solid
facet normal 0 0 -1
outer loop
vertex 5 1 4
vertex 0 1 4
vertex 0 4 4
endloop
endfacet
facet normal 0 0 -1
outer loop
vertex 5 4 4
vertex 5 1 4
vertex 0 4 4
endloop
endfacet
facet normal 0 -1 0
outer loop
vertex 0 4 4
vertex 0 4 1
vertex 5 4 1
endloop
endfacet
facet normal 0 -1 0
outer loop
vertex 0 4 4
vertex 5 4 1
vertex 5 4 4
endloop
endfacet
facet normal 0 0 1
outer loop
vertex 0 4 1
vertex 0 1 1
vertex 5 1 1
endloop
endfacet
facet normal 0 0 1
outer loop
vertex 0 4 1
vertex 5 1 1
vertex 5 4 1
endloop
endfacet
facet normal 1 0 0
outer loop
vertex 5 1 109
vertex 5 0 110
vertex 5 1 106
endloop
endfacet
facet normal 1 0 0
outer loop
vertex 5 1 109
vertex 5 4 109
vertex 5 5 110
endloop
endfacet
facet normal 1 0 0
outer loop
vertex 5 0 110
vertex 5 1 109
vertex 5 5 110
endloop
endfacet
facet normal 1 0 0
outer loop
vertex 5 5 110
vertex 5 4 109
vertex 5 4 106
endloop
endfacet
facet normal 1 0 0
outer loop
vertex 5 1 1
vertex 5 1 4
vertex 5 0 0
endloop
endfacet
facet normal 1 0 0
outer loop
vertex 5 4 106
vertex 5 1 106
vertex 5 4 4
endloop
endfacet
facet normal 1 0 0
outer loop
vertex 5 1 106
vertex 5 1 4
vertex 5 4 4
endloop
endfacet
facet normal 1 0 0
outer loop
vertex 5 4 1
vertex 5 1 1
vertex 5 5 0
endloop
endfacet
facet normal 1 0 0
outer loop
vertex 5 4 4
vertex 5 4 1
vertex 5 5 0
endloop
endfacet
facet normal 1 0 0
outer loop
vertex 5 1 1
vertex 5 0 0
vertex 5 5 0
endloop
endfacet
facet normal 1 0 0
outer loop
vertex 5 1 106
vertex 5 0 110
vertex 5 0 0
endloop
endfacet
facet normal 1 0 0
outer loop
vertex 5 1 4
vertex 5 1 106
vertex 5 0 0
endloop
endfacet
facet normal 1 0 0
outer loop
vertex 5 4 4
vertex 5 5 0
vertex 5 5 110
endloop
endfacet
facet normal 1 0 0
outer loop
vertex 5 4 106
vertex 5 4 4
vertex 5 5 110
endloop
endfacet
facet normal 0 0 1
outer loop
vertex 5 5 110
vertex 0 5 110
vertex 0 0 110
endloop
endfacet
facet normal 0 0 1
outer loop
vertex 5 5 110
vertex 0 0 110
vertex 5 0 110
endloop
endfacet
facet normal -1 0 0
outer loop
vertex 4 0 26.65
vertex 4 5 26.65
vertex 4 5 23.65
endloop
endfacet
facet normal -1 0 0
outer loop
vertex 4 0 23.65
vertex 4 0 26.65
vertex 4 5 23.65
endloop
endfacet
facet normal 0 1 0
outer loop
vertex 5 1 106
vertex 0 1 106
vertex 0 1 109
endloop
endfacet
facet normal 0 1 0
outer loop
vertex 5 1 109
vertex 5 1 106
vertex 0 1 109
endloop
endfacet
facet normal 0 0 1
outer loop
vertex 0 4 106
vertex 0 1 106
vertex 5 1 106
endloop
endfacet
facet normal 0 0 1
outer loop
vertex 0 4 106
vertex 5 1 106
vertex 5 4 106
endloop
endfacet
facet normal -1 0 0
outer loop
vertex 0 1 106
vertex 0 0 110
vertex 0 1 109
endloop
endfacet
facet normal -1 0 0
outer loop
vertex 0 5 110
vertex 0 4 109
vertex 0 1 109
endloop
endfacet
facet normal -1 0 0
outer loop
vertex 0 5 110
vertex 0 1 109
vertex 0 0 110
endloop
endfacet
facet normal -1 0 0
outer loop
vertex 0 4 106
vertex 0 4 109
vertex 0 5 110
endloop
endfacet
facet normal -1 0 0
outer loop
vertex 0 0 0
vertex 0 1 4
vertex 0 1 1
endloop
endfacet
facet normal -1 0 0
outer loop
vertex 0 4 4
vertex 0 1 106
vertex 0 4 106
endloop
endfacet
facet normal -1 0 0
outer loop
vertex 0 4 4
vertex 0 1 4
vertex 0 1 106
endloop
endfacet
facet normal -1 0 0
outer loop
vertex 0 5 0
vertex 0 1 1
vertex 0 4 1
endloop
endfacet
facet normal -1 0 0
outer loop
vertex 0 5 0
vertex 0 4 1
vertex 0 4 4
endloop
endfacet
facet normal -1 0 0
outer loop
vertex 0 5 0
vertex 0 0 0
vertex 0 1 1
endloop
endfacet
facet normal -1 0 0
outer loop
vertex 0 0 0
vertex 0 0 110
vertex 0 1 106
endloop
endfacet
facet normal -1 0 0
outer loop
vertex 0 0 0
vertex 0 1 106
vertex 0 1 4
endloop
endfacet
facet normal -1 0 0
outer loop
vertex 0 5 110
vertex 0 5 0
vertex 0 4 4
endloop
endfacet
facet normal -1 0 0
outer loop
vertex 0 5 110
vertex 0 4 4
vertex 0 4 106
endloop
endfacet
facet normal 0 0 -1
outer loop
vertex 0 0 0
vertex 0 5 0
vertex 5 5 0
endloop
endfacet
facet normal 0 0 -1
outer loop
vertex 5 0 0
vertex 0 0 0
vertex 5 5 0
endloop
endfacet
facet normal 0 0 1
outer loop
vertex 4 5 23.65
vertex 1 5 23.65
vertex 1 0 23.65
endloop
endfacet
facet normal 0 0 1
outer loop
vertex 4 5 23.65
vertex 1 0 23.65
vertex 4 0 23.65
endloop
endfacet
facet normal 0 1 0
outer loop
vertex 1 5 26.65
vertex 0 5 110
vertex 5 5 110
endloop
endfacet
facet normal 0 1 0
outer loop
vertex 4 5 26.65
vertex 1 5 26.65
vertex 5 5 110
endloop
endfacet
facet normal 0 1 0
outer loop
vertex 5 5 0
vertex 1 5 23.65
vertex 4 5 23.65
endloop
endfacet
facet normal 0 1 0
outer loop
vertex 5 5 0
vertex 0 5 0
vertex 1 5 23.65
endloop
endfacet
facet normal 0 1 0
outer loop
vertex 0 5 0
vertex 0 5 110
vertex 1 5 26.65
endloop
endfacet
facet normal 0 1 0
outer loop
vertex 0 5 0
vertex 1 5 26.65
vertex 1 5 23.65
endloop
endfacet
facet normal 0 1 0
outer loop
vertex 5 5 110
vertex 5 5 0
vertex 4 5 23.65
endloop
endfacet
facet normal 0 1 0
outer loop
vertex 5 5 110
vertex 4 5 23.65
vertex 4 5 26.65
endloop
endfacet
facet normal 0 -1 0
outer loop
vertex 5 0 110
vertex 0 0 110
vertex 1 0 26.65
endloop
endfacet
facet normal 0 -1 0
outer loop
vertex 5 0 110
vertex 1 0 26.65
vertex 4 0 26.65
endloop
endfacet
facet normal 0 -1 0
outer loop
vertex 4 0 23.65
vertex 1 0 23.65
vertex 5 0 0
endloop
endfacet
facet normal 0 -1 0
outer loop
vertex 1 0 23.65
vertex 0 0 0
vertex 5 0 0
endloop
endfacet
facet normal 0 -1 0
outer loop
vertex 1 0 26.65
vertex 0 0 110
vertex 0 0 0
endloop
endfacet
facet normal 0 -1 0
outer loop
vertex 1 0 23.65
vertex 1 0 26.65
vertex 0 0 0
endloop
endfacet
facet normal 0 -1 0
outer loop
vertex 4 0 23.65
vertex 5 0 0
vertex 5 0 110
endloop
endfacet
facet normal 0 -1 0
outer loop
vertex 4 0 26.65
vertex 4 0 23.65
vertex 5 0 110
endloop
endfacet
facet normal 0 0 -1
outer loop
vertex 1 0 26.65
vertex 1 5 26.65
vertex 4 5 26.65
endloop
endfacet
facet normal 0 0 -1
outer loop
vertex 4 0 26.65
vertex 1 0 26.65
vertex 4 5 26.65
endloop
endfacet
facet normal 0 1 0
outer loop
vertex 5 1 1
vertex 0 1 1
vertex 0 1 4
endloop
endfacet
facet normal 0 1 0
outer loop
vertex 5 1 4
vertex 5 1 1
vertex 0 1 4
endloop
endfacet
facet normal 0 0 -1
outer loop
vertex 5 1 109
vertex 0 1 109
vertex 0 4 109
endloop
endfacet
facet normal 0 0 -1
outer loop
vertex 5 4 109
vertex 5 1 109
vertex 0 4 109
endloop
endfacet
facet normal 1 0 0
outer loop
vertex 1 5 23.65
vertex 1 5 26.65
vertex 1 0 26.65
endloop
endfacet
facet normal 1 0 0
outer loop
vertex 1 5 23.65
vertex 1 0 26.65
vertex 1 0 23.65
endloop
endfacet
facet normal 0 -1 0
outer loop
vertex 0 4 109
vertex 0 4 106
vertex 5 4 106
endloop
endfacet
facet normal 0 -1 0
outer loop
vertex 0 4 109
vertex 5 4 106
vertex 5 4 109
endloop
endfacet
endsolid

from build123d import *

# Parameters (mm, degrees)
SKETCH1_W           = 5
SKETCH1_H           = 5
BOSS_EXTRUDE1_DEPTH = 110
SKETCH2_W           = 3
SKETCH2_H           = 3
CUT_EXTRUDE1_DEPTH  = 9
SKETCH3_W           = 3
SKETCH3_H           = 3
CUT_EXTRUDE2_DEPTH  = 9


with BuildPart() as part:
    # Sketch1 → Boss-Extrude1 (new body)
    with BuildSketch(Plane.XY):
        with Locations((2.5, 2.5)):
            Rectangle(SKETCH1_W, SKETCH1_H)
    extrude(amount=BOSS_EXTRUDE1_DEPTH)

    # Sketch2 → Cut-Extrude1 (cut)
    with BuildSketch(Plane.ZY):
        with Locations((2.5, 2.5)):
            Rectangle(SKETCH2_W, SKETCH2_H)
        with Locations((107.5, 2.5)):
            Rectangle(SKETCH2_W, SKETCH2_H)
    extrude(amount=-CUT_EXTRUDE1_DEPTH, mode=Mode.SUBTRACT)

    # Sketch3 → Cut-Extrude2 (cut)
    with BuildSketch(Plane(origin=(0, 5, 0), x_dir=(1, 0, 0), z_dir=(0, 1, 0))):
        with Locations((2.5, -25.15)):
            Rectangle(SKETCH3_W, SKETCH3_H)
    extrude(amount=-CUT_EXTRUDE2_DEPTH, mode=Mode.SUBTRACT)


solid = part.part
